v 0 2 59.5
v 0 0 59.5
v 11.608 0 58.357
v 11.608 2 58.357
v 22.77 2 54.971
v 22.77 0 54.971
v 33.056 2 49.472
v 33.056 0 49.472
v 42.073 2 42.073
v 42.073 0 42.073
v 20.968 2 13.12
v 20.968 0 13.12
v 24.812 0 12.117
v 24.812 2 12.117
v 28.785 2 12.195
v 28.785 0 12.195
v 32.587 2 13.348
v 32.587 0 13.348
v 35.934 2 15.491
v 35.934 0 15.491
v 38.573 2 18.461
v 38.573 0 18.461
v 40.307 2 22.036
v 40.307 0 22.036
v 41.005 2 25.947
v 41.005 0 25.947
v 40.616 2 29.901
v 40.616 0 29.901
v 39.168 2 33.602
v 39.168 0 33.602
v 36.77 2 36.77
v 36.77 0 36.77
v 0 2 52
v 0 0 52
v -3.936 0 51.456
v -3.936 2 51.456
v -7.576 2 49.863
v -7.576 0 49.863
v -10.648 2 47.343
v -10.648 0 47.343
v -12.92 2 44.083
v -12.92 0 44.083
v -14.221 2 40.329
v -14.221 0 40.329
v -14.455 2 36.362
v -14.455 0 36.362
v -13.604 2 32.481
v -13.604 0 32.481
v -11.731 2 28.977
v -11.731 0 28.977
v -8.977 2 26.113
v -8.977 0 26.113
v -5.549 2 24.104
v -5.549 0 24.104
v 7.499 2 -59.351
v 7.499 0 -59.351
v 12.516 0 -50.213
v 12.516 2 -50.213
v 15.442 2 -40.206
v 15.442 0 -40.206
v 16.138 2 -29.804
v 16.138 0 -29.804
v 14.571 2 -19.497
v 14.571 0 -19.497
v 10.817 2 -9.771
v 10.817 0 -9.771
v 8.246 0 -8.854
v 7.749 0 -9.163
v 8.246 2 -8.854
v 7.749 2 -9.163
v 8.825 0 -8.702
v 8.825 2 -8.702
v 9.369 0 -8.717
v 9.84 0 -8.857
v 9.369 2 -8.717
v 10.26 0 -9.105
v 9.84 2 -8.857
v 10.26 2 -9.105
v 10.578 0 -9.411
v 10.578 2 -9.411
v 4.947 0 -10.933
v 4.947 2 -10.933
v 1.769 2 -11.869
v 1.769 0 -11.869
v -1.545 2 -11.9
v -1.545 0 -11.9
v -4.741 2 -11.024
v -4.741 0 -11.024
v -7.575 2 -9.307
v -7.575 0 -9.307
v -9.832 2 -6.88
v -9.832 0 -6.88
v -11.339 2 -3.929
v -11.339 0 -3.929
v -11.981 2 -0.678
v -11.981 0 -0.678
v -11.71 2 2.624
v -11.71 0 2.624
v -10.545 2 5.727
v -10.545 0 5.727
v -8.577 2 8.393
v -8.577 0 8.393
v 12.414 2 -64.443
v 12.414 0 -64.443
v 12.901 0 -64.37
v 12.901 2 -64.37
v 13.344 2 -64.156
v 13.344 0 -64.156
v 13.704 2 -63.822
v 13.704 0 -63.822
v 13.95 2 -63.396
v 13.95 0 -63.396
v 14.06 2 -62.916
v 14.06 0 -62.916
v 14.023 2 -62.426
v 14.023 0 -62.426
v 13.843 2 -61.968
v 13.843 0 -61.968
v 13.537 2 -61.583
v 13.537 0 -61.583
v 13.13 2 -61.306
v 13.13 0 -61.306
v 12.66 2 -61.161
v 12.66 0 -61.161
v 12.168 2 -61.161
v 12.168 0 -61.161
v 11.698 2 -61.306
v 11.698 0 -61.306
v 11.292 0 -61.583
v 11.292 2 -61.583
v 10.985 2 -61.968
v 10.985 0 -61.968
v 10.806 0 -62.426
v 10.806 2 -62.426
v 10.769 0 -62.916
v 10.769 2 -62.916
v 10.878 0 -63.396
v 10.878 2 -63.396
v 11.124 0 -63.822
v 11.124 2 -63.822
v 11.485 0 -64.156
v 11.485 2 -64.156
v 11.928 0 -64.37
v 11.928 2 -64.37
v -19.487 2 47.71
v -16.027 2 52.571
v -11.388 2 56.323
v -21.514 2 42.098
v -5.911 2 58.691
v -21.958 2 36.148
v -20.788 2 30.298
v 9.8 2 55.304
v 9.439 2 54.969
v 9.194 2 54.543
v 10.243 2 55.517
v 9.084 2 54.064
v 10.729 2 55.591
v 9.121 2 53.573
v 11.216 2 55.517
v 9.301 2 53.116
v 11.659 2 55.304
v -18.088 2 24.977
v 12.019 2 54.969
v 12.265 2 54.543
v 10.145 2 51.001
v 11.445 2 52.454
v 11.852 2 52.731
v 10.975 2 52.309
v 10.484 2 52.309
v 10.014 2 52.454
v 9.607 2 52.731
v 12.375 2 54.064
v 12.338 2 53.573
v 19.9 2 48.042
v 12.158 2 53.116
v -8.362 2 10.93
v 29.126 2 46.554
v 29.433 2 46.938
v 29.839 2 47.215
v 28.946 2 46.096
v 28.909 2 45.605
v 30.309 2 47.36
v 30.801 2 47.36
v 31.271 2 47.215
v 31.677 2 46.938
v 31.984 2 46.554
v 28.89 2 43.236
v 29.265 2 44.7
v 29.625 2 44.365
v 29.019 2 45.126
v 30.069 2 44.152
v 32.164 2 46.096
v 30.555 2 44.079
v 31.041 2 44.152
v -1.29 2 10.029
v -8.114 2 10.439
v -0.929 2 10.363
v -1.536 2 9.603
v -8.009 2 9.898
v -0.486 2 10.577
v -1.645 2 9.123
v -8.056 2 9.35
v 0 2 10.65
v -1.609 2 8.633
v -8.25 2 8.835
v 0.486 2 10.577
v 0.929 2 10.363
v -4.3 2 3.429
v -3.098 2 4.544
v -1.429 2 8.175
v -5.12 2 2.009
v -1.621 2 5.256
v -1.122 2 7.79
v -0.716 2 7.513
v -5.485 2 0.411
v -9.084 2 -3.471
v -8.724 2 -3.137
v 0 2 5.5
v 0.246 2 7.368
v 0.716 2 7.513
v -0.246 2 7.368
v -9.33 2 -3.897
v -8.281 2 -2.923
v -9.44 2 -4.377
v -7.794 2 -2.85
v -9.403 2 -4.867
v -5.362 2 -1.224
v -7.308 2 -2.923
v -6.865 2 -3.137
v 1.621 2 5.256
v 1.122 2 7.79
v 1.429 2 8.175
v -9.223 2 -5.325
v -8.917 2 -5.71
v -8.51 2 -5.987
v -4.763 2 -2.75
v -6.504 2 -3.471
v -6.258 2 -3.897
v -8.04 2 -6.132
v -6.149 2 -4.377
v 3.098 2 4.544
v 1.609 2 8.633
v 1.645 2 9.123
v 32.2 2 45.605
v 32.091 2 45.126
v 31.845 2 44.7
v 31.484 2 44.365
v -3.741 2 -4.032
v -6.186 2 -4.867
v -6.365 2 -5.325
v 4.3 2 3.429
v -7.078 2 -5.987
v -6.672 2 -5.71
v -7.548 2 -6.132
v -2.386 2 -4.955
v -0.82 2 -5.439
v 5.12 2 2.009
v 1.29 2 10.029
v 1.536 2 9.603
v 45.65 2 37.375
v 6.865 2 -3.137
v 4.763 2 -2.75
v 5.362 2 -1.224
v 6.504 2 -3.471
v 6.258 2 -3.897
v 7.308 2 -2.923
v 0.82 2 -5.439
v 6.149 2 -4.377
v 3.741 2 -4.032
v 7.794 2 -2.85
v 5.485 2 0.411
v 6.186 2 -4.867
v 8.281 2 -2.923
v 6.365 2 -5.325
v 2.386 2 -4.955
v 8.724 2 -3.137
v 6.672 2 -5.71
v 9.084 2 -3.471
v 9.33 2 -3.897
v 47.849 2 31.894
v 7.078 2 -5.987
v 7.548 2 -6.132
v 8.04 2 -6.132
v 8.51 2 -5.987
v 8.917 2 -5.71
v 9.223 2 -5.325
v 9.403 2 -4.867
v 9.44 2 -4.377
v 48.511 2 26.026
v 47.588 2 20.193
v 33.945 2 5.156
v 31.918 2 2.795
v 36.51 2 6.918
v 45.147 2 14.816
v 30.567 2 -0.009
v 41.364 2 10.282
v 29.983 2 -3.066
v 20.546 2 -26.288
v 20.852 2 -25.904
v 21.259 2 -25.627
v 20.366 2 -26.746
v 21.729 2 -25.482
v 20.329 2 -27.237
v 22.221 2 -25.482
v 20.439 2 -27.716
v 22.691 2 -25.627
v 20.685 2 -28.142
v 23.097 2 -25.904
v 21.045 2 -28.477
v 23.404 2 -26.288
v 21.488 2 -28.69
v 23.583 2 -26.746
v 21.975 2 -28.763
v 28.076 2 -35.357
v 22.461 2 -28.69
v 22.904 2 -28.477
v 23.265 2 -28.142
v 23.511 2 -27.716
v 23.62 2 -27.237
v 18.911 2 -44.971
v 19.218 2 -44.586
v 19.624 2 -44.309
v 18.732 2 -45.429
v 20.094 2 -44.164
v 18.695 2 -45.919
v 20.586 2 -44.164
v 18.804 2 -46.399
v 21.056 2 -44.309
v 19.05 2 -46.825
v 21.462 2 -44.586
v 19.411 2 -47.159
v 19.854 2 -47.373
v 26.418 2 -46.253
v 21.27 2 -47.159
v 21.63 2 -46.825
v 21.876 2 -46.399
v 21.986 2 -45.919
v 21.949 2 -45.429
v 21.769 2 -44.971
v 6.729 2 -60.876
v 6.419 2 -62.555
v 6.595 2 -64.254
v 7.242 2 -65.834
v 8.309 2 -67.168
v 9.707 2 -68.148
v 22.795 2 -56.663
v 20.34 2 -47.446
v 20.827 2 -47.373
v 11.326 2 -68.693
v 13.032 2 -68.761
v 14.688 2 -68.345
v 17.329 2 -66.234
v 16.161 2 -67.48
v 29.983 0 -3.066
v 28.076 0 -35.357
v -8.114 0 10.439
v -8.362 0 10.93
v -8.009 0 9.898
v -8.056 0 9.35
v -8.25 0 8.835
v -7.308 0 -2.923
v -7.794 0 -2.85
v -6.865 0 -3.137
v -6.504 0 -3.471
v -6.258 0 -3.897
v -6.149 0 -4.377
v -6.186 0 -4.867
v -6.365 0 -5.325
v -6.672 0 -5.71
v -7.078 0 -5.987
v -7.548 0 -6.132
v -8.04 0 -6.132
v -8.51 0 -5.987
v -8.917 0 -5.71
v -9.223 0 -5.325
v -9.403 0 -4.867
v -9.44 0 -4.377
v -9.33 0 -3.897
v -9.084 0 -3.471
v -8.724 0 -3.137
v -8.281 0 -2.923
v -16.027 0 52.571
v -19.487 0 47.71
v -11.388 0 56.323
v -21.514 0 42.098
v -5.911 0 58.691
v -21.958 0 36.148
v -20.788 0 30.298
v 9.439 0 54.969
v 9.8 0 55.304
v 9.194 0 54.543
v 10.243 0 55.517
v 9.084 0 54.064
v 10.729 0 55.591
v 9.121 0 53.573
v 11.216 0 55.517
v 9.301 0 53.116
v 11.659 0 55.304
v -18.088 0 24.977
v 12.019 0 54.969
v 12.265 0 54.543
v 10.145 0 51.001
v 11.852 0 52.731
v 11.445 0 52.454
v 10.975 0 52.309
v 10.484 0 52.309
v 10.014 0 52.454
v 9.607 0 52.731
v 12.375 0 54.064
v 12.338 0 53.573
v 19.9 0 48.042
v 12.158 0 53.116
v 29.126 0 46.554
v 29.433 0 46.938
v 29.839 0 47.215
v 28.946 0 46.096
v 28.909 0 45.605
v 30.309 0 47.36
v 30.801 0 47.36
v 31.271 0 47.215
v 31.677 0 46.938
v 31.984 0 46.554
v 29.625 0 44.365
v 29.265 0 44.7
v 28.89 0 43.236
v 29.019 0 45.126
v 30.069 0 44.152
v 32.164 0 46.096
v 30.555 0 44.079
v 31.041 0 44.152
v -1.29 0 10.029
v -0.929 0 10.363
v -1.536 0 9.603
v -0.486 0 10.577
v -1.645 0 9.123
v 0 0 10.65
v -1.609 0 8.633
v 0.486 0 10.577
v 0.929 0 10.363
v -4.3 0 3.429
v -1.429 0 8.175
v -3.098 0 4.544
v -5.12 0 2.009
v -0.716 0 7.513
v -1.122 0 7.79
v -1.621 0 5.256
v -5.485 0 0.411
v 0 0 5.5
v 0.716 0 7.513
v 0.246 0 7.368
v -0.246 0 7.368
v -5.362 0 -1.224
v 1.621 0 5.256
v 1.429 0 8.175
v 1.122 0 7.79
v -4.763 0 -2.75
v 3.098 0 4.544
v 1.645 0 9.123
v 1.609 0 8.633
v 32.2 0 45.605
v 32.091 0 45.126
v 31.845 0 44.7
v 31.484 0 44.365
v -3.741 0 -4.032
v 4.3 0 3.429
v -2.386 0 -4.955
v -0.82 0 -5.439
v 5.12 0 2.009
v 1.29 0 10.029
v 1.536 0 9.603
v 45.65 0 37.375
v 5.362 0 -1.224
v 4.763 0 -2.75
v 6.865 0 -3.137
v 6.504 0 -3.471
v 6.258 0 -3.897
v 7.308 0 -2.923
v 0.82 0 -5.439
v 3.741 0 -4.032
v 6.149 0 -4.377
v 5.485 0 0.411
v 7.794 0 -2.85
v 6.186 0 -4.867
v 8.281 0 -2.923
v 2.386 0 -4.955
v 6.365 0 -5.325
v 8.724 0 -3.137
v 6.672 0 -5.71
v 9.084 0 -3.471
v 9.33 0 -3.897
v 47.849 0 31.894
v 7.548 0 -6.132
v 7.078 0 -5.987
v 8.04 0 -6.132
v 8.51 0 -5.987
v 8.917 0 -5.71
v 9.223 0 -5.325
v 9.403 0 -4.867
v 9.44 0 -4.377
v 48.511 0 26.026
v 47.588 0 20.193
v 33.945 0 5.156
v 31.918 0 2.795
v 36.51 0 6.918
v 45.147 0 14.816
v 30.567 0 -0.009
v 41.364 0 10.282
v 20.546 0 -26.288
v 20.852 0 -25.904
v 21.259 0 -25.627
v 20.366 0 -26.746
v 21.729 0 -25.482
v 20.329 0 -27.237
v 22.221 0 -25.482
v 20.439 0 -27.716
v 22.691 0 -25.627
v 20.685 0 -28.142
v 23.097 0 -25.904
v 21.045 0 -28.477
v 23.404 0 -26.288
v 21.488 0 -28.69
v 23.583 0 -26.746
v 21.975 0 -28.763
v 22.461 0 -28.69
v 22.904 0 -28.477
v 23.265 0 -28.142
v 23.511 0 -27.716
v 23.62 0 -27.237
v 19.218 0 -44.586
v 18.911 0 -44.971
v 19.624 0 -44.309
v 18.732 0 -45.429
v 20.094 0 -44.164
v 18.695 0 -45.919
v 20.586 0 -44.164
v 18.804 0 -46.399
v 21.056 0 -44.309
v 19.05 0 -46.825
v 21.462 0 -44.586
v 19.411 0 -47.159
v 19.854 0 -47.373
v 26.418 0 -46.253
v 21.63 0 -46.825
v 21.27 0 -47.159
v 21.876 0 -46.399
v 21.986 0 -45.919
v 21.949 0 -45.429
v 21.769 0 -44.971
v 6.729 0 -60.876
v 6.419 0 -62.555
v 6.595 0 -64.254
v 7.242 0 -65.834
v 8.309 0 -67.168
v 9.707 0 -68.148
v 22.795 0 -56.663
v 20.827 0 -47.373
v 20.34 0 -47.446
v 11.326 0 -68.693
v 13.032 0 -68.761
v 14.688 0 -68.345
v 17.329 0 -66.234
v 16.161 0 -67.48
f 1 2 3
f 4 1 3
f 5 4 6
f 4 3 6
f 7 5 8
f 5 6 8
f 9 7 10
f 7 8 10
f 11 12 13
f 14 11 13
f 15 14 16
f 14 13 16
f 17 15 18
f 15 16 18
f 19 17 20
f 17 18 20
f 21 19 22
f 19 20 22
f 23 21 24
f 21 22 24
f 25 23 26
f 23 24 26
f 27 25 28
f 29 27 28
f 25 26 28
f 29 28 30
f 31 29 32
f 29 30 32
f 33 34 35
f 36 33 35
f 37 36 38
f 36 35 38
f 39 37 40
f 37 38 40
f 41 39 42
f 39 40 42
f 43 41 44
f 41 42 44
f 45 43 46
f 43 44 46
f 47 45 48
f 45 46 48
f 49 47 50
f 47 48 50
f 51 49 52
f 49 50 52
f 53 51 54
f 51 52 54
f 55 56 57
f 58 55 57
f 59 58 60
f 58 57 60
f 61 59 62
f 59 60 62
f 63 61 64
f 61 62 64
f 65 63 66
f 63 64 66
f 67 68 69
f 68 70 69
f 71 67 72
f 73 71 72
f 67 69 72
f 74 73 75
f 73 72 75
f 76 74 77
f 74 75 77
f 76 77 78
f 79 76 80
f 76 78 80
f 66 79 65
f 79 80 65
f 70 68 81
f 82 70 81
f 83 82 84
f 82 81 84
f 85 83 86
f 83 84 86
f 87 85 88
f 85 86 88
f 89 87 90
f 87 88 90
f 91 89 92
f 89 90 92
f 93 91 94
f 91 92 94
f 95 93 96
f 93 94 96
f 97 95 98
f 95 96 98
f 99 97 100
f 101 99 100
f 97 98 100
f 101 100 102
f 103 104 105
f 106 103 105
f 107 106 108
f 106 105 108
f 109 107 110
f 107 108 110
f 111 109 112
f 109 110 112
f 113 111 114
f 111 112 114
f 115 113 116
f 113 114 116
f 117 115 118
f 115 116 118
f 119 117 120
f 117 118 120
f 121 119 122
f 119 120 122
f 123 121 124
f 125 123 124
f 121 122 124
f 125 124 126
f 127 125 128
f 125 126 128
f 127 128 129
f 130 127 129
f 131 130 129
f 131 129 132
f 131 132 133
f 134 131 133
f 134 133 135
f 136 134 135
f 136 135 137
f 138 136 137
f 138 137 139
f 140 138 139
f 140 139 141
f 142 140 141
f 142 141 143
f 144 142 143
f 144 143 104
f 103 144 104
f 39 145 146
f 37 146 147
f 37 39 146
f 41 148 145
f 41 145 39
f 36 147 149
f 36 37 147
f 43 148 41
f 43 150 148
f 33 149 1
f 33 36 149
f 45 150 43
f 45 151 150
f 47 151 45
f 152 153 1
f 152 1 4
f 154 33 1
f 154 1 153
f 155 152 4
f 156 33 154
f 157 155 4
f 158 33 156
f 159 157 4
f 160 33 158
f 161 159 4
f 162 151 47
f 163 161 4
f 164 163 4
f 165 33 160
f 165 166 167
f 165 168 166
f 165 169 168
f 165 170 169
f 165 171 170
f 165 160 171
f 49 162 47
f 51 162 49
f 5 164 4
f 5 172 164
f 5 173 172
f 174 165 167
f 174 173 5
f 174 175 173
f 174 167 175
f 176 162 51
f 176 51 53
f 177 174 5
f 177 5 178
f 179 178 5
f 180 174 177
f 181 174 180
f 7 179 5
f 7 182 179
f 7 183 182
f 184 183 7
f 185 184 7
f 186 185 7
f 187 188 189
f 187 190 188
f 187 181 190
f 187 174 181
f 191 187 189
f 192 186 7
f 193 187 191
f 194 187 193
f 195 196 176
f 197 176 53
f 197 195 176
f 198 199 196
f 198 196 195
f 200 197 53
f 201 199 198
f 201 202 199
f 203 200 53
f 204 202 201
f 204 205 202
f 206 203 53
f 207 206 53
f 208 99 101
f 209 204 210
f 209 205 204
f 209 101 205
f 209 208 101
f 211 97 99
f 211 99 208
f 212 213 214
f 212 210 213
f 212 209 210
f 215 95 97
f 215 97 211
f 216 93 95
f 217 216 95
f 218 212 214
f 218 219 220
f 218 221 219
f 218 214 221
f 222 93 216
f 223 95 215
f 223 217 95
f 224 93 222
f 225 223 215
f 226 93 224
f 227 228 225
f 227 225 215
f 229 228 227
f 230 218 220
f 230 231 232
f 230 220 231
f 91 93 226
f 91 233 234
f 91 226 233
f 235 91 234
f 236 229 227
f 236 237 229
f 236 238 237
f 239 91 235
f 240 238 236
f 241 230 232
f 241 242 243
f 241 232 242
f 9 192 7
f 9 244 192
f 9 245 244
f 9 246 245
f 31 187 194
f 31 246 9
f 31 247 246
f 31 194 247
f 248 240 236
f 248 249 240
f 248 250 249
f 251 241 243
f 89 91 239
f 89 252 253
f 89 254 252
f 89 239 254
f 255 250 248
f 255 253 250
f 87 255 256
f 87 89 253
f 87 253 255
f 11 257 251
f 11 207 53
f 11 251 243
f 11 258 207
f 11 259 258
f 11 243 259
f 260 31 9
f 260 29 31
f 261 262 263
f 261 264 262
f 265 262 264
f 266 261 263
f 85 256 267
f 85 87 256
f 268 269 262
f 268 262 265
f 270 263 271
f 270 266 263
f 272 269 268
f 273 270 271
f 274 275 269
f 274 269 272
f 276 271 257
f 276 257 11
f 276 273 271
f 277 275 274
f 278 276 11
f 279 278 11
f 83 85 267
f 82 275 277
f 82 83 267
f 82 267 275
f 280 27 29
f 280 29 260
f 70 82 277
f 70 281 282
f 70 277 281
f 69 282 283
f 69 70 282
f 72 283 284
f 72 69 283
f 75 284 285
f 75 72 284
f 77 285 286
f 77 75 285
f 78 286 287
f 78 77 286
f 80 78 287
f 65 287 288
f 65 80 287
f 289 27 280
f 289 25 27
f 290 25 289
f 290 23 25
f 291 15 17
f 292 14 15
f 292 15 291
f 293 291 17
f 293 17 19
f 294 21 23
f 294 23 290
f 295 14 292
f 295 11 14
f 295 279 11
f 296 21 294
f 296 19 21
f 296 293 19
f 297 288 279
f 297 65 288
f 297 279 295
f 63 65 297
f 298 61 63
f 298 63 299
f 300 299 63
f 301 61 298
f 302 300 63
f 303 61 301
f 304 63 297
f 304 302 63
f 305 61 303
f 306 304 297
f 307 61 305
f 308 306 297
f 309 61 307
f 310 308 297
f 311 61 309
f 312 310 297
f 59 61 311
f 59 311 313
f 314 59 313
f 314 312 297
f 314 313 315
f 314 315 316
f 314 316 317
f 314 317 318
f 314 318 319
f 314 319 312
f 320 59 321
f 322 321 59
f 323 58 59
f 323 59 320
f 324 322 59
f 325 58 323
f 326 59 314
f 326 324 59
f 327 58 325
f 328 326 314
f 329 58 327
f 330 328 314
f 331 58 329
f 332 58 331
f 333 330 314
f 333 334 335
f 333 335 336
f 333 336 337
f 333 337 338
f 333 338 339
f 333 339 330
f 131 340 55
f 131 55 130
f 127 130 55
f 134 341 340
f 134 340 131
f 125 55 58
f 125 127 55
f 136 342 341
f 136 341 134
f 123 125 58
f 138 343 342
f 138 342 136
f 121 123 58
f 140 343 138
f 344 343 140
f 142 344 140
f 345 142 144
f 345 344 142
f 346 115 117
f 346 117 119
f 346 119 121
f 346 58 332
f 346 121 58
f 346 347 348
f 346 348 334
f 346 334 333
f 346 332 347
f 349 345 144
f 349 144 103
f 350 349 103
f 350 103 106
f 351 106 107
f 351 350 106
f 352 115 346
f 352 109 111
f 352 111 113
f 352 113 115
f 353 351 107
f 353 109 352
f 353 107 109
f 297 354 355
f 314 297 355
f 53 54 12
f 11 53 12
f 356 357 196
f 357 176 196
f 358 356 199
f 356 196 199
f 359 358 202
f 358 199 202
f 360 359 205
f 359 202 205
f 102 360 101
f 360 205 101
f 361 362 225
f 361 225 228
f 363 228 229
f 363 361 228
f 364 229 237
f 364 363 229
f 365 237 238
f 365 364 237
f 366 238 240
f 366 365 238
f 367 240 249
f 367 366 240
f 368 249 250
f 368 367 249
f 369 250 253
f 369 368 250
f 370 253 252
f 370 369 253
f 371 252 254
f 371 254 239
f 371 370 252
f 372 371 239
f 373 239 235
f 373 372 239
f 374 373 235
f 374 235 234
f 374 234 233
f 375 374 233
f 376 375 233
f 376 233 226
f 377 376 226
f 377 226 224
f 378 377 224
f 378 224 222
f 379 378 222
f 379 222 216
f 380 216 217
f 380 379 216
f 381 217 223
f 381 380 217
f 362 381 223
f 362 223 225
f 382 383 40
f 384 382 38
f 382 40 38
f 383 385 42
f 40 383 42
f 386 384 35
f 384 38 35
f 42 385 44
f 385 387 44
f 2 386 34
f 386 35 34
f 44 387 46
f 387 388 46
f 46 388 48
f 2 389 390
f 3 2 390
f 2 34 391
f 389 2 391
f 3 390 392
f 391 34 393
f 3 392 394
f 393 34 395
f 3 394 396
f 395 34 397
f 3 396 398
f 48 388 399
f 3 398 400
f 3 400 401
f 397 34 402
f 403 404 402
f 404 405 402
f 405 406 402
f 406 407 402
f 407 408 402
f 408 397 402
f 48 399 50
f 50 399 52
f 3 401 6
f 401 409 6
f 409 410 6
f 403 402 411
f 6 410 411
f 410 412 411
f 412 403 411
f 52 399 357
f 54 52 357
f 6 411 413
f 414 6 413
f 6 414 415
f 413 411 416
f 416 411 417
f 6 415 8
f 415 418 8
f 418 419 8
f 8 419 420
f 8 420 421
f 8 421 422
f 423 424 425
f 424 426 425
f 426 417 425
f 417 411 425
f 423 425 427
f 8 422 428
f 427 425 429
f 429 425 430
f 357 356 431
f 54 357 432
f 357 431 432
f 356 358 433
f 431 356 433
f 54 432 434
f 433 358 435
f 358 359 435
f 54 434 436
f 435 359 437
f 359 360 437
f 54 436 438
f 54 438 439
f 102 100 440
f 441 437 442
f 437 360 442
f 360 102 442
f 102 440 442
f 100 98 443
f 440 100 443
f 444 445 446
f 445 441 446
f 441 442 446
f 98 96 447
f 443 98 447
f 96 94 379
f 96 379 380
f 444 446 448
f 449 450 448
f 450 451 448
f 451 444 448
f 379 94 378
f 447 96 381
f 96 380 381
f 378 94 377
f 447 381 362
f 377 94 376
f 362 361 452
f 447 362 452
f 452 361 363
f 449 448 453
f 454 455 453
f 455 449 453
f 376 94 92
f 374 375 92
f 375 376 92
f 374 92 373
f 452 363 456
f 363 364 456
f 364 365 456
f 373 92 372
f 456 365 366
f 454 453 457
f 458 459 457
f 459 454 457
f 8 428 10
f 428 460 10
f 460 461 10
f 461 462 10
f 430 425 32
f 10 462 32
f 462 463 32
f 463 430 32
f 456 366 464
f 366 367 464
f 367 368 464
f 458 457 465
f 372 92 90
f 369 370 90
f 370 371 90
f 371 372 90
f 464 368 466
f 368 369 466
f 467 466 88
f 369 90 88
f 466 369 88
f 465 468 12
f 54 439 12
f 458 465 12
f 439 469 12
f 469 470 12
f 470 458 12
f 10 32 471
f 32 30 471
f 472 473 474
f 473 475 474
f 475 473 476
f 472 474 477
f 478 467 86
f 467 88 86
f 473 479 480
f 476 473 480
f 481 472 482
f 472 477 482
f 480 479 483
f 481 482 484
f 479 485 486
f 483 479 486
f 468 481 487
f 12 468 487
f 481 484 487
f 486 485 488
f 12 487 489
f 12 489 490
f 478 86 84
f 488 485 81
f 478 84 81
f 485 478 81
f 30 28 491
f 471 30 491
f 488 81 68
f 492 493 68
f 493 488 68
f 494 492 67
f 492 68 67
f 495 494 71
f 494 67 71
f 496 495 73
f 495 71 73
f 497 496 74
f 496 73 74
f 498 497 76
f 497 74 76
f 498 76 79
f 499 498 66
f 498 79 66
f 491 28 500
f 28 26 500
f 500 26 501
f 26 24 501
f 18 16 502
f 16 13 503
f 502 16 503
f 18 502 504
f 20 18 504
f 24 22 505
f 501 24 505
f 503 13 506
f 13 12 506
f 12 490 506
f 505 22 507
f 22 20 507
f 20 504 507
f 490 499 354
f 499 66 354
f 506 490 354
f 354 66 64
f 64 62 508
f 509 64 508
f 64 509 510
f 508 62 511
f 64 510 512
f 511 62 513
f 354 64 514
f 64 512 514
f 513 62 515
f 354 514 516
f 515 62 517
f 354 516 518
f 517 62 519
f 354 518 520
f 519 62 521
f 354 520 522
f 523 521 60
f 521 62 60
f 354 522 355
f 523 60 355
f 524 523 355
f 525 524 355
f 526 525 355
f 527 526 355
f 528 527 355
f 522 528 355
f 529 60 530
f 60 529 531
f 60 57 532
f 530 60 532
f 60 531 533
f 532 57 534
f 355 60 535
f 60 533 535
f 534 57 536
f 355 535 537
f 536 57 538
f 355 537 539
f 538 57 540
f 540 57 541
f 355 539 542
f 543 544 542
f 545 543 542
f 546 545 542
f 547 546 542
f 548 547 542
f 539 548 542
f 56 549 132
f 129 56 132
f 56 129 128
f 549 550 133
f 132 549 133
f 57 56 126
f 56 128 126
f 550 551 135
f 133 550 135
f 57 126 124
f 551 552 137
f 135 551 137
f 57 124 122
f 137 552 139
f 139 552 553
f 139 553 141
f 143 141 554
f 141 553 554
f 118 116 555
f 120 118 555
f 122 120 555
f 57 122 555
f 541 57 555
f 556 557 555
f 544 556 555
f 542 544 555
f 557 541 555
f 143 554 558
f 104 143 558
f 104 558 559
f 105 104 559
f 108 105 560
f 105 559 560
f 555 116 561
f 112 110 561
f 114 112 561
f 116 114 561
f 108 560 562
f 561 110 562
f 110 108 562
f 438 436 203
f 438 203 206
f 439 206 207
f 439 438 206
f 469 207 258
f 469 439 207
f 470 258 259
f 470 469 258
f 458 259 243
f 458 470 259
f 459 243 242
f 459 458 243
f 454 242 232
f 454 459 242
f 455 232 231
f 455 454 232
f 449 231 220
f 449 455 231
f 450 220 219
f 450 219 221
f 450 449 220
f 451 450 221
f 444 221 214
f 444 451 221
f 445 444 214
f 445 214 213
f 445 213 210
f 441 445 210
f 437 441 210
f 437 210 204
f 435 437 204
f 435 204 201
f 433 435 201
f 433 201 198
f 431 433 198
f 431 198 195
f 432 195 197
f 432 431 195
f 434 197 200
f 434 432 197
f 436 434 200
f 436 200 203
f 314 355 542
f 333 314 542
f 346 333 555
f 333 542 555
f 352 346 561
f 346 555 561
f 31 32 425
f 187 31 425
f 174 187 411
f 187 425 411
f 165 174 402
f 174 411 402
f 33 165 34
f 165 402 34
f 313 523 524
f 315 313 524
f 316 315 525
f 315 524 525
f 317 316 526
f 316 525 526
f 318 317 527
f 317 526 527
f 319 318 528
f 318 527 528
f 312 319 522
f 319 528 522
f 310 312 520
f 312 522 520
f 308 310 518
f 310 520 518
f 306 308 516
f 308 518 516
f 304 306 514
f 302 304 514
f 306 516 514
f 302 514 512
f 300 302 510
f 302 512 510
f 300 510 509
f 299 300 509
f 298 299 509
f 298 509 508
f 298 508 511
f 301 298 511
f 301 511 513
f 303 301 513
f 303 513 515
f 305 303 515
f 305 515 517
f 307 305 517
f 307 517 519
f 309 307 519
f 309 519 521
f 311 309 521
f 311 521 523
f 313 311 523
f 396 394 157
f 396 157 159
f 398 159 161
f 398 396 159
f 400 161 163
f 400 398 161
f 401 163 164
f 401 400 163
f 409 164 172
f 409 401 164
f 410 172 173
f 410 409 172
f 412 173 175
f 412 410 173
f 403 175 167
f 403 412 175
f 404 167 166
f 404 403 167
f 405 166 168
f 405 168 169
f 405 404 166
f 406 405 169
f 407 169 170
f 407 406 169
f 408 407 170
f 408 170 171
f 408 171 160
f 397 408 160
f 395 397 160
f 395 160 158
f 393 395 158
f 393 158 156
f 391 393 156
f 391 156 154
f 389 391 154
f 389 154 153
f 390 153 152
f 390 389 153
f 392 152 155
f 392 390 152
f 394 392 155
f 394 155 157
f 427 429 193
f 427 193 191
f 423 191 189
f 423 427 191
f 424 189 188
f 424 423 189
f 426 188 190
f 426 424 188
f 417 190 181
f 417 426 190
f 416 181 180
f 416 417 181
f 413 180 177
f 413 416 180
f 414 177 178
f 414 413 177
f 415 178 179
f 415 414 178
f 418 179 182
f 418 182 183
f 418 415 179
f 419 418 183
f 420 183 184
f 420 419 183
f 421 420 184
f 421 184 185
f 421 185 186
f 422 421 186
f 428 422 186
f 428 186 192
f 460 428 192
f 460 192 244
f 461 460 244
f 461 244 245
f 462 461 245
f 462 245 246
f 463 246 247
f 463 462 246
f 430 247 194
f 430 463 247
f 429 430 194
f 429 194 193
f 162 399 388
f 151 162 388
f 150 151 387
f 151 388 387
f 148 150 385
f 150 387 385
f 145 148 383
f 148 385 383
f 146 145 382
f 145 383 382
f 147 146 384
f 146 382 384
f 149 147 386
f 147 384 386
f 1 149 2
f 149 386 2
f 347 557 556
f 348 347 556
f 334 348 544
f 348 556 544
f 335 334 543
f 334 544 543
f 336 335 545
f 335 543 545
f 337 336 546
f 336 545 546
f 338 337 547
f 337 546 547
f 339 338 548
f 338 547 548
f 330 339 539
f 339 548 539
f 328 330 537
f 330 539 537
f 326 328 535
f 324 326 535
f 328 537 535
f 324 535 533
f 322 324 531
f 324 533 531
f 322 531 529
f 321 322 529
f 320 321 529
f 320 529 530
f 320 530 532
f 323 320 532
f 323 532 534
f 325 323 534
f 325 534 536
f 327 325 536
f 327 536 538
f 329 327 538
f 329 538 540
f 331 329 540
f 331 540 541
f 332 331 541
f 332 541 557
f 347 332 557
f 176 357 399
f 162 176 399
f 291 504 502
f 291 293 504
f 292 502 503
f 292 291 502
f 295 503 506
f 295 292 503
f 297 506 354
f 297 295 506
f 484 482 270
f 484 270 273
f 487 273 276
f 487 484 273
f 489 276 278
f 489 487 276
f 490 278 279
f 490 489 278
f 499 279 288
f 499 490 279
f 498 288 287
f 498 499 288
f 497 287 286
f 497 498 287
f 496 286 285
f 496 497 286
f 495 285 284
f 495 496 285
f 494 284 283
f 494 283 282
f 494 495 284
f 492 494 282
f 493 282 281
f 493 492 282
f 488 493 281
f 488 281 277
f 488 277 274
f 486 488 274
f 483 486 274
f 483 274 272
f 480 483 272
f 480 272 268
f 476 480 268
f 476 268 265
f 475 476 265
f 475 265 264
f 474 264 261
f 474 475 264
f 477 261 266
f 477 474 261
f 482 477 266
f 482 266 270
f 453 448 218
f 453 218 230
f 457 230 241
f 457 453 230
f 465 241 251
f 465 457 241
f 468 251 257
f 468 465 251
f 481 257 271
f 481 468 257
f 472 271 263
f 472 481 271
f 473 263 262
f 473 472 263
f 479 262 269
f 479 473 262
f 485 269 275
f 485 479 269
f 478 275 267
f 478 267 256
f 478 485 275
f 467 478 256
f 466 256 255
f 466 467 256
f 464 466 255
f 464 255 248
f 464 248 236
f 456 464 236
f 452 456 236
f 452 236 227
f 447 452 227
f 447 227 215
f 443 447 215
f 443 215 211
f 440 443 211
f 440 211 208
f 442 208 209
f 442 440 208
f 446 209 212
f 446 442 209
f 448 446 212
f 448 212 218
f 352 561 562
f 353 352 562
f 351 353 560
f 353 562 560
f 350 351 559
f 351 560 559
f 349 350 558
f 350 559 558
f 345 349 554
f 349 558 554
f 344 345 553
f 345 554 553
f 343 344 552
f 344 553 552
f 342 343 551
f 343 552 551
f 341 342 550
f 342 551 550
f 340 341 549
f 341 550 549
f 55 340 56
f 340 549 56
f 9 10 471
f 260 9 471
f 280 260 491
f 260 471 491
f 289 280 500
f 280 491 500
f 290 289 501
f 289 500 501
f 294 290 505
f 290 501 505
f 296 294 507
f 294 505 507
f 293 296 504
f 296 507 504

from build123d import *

# Parameters (mm, degrees)
SKETCH_1_R          = 1.65
SKETCH_1_R_2        = 5.5
EXTRUDE_1_DEPTH     = 2
SKETCH_2_R          = 1.65
CUT_EXTRUDE_1_DEPTH = 85.204030668
FILLET_1_R          = 2
FILLET_2_R          = 12


with BuildPart() as part:
    # Эскиз1 → Бобышка-Вытянуть1 (new body)
    with BuildSketch(Plane(origin=(0, 0, 0), x_dir=(1, 0, 0), z_dir=(0, 1, 0))):
        with BuildLine():
            Line((-7.358068948, -9.479389292), (-18.08780174, -24.976764467))
            ThreePointArc((-18.08780174, -24.976764467), (-19.487318719, -47.710015139), (0, -59.5))
            ThreePointArc((0, -59.5), (22.769664226, -54.970832184), (42.072853481, -42.072853481))
            ThreePointArc((42.072853481, -42.072853481), (47.515690449, -19.956460022), (30.451246794, -4.87123226))
            Line((30.451246794, -4.87123226), (28.075866666, 35.356540564))
            ThreePointArc((28.075866666, 35.356540564), (24.846341863, 51.541564262), (17.329317504, 66.234391334))
            ThreePointArc((17.329317504, 66.234391334), (8.97294662, 67.707844982), (7.499492972, 59.351474098))
            ThreePointArc((7.499492972, 59.351474098), (16.145431017, 33.64630977), (9.479389292, 7.358068948))
            ThreePointArc((9.479389292, 7.358068948), (-8.485281374, 8.485281374), (-7.358068948, -9.479389292))
        make_face()
        with Locations(Location((10.729446295, -53.940569088, 0), (0, 0, 270))):
            Circle(SKETCH_1_R, mode=Mode.SUBTRACT)
        with Locations(Location((30.554877949, -45.728606417, 0), (0, 0, 90))):
            Circle(SKETCH_1_R, mode=Mode.SUBTRACT)
        with Locations(Location((0, 0, 0), (0, 0, 270))):
            Circle(SKETCH_1_R_2, mode=Mode.SUBTRACT)
        with Locations(Location((0, -9, 0), (0, 0, 270))):
            Circle(SKETCH_1_R, mode=Mode.SUBTRACT)
        with Locations(Location((-7.794228634, 4.5, 0), (0, 0, 270))):
            Circle(SKETCH_1_R, mode=Mode.SUBTRACT)
        with Locations(Location((7.794228634, 4.5, 0), (0, 0, 270))):
            Circle(SKETCH_1_R, mode=Mode.SUBTRACT)
        with BuildLine():
            Line((-5.548909769, -24.103746779), (20.967594525, -13.120251073))
            ThreePointArc((20.967594525, -13.120251073), (38.572813673, -18.460735916), (36.769552622, -36.769552622))
            ThreePointArc((36.769552622, -36.769552622), (19.899538483, -48.041735691), (0, -52))
            ThreePointArc((0, -52), (-14.221386566, -40.328809669), (-5.548909769, -24.103746779))
        make_face(mode=Mode.SUBTRACT)
    extrude(amount=EXTRUDE_1_DEPTH)

    # Эскиз2 → Вырез-Вытянуть1 (cut, through all)
    with BuildSketch(Plane.XZ):
        with Locations(Location((21.974708544, -27.113395045, 0), (0, 0, 270))):
            Circle(SKETCH_2_R)
        with Locations(Location((12.414405238, -62.792932716, 0), (0, 0, 270))):
            Circle(SKETCH_2_R)
        with Locations(Location((20.340189466, -45.796033589, 0), (0, 0, 270))):
            Circle(SKETCH_2_R)
    extrude(amount=-CUT_EXTRUDE_1_DEPTH, mode=Mode.SUBTRACT)

    # Скругление1
    fillet_1_edges = [part.edges().sort_by_distance(p)[0] for p in [
        (-7.358068948, 1, 9.479389292),
        (9.479389292, 1, -7.358068948),
    ]]
    fillet(fillet_1_edges, radius=FILLET_1_R)

    # Скругление2
    fillet_2_edges = [part.edges().sort_by_distance(p)[0] for p in [
        (30.451246794, 1, 4.87123226),
    ]]
    fillet(fillet_2_edges, radius=FILLET_2_R)


solid = part.part
